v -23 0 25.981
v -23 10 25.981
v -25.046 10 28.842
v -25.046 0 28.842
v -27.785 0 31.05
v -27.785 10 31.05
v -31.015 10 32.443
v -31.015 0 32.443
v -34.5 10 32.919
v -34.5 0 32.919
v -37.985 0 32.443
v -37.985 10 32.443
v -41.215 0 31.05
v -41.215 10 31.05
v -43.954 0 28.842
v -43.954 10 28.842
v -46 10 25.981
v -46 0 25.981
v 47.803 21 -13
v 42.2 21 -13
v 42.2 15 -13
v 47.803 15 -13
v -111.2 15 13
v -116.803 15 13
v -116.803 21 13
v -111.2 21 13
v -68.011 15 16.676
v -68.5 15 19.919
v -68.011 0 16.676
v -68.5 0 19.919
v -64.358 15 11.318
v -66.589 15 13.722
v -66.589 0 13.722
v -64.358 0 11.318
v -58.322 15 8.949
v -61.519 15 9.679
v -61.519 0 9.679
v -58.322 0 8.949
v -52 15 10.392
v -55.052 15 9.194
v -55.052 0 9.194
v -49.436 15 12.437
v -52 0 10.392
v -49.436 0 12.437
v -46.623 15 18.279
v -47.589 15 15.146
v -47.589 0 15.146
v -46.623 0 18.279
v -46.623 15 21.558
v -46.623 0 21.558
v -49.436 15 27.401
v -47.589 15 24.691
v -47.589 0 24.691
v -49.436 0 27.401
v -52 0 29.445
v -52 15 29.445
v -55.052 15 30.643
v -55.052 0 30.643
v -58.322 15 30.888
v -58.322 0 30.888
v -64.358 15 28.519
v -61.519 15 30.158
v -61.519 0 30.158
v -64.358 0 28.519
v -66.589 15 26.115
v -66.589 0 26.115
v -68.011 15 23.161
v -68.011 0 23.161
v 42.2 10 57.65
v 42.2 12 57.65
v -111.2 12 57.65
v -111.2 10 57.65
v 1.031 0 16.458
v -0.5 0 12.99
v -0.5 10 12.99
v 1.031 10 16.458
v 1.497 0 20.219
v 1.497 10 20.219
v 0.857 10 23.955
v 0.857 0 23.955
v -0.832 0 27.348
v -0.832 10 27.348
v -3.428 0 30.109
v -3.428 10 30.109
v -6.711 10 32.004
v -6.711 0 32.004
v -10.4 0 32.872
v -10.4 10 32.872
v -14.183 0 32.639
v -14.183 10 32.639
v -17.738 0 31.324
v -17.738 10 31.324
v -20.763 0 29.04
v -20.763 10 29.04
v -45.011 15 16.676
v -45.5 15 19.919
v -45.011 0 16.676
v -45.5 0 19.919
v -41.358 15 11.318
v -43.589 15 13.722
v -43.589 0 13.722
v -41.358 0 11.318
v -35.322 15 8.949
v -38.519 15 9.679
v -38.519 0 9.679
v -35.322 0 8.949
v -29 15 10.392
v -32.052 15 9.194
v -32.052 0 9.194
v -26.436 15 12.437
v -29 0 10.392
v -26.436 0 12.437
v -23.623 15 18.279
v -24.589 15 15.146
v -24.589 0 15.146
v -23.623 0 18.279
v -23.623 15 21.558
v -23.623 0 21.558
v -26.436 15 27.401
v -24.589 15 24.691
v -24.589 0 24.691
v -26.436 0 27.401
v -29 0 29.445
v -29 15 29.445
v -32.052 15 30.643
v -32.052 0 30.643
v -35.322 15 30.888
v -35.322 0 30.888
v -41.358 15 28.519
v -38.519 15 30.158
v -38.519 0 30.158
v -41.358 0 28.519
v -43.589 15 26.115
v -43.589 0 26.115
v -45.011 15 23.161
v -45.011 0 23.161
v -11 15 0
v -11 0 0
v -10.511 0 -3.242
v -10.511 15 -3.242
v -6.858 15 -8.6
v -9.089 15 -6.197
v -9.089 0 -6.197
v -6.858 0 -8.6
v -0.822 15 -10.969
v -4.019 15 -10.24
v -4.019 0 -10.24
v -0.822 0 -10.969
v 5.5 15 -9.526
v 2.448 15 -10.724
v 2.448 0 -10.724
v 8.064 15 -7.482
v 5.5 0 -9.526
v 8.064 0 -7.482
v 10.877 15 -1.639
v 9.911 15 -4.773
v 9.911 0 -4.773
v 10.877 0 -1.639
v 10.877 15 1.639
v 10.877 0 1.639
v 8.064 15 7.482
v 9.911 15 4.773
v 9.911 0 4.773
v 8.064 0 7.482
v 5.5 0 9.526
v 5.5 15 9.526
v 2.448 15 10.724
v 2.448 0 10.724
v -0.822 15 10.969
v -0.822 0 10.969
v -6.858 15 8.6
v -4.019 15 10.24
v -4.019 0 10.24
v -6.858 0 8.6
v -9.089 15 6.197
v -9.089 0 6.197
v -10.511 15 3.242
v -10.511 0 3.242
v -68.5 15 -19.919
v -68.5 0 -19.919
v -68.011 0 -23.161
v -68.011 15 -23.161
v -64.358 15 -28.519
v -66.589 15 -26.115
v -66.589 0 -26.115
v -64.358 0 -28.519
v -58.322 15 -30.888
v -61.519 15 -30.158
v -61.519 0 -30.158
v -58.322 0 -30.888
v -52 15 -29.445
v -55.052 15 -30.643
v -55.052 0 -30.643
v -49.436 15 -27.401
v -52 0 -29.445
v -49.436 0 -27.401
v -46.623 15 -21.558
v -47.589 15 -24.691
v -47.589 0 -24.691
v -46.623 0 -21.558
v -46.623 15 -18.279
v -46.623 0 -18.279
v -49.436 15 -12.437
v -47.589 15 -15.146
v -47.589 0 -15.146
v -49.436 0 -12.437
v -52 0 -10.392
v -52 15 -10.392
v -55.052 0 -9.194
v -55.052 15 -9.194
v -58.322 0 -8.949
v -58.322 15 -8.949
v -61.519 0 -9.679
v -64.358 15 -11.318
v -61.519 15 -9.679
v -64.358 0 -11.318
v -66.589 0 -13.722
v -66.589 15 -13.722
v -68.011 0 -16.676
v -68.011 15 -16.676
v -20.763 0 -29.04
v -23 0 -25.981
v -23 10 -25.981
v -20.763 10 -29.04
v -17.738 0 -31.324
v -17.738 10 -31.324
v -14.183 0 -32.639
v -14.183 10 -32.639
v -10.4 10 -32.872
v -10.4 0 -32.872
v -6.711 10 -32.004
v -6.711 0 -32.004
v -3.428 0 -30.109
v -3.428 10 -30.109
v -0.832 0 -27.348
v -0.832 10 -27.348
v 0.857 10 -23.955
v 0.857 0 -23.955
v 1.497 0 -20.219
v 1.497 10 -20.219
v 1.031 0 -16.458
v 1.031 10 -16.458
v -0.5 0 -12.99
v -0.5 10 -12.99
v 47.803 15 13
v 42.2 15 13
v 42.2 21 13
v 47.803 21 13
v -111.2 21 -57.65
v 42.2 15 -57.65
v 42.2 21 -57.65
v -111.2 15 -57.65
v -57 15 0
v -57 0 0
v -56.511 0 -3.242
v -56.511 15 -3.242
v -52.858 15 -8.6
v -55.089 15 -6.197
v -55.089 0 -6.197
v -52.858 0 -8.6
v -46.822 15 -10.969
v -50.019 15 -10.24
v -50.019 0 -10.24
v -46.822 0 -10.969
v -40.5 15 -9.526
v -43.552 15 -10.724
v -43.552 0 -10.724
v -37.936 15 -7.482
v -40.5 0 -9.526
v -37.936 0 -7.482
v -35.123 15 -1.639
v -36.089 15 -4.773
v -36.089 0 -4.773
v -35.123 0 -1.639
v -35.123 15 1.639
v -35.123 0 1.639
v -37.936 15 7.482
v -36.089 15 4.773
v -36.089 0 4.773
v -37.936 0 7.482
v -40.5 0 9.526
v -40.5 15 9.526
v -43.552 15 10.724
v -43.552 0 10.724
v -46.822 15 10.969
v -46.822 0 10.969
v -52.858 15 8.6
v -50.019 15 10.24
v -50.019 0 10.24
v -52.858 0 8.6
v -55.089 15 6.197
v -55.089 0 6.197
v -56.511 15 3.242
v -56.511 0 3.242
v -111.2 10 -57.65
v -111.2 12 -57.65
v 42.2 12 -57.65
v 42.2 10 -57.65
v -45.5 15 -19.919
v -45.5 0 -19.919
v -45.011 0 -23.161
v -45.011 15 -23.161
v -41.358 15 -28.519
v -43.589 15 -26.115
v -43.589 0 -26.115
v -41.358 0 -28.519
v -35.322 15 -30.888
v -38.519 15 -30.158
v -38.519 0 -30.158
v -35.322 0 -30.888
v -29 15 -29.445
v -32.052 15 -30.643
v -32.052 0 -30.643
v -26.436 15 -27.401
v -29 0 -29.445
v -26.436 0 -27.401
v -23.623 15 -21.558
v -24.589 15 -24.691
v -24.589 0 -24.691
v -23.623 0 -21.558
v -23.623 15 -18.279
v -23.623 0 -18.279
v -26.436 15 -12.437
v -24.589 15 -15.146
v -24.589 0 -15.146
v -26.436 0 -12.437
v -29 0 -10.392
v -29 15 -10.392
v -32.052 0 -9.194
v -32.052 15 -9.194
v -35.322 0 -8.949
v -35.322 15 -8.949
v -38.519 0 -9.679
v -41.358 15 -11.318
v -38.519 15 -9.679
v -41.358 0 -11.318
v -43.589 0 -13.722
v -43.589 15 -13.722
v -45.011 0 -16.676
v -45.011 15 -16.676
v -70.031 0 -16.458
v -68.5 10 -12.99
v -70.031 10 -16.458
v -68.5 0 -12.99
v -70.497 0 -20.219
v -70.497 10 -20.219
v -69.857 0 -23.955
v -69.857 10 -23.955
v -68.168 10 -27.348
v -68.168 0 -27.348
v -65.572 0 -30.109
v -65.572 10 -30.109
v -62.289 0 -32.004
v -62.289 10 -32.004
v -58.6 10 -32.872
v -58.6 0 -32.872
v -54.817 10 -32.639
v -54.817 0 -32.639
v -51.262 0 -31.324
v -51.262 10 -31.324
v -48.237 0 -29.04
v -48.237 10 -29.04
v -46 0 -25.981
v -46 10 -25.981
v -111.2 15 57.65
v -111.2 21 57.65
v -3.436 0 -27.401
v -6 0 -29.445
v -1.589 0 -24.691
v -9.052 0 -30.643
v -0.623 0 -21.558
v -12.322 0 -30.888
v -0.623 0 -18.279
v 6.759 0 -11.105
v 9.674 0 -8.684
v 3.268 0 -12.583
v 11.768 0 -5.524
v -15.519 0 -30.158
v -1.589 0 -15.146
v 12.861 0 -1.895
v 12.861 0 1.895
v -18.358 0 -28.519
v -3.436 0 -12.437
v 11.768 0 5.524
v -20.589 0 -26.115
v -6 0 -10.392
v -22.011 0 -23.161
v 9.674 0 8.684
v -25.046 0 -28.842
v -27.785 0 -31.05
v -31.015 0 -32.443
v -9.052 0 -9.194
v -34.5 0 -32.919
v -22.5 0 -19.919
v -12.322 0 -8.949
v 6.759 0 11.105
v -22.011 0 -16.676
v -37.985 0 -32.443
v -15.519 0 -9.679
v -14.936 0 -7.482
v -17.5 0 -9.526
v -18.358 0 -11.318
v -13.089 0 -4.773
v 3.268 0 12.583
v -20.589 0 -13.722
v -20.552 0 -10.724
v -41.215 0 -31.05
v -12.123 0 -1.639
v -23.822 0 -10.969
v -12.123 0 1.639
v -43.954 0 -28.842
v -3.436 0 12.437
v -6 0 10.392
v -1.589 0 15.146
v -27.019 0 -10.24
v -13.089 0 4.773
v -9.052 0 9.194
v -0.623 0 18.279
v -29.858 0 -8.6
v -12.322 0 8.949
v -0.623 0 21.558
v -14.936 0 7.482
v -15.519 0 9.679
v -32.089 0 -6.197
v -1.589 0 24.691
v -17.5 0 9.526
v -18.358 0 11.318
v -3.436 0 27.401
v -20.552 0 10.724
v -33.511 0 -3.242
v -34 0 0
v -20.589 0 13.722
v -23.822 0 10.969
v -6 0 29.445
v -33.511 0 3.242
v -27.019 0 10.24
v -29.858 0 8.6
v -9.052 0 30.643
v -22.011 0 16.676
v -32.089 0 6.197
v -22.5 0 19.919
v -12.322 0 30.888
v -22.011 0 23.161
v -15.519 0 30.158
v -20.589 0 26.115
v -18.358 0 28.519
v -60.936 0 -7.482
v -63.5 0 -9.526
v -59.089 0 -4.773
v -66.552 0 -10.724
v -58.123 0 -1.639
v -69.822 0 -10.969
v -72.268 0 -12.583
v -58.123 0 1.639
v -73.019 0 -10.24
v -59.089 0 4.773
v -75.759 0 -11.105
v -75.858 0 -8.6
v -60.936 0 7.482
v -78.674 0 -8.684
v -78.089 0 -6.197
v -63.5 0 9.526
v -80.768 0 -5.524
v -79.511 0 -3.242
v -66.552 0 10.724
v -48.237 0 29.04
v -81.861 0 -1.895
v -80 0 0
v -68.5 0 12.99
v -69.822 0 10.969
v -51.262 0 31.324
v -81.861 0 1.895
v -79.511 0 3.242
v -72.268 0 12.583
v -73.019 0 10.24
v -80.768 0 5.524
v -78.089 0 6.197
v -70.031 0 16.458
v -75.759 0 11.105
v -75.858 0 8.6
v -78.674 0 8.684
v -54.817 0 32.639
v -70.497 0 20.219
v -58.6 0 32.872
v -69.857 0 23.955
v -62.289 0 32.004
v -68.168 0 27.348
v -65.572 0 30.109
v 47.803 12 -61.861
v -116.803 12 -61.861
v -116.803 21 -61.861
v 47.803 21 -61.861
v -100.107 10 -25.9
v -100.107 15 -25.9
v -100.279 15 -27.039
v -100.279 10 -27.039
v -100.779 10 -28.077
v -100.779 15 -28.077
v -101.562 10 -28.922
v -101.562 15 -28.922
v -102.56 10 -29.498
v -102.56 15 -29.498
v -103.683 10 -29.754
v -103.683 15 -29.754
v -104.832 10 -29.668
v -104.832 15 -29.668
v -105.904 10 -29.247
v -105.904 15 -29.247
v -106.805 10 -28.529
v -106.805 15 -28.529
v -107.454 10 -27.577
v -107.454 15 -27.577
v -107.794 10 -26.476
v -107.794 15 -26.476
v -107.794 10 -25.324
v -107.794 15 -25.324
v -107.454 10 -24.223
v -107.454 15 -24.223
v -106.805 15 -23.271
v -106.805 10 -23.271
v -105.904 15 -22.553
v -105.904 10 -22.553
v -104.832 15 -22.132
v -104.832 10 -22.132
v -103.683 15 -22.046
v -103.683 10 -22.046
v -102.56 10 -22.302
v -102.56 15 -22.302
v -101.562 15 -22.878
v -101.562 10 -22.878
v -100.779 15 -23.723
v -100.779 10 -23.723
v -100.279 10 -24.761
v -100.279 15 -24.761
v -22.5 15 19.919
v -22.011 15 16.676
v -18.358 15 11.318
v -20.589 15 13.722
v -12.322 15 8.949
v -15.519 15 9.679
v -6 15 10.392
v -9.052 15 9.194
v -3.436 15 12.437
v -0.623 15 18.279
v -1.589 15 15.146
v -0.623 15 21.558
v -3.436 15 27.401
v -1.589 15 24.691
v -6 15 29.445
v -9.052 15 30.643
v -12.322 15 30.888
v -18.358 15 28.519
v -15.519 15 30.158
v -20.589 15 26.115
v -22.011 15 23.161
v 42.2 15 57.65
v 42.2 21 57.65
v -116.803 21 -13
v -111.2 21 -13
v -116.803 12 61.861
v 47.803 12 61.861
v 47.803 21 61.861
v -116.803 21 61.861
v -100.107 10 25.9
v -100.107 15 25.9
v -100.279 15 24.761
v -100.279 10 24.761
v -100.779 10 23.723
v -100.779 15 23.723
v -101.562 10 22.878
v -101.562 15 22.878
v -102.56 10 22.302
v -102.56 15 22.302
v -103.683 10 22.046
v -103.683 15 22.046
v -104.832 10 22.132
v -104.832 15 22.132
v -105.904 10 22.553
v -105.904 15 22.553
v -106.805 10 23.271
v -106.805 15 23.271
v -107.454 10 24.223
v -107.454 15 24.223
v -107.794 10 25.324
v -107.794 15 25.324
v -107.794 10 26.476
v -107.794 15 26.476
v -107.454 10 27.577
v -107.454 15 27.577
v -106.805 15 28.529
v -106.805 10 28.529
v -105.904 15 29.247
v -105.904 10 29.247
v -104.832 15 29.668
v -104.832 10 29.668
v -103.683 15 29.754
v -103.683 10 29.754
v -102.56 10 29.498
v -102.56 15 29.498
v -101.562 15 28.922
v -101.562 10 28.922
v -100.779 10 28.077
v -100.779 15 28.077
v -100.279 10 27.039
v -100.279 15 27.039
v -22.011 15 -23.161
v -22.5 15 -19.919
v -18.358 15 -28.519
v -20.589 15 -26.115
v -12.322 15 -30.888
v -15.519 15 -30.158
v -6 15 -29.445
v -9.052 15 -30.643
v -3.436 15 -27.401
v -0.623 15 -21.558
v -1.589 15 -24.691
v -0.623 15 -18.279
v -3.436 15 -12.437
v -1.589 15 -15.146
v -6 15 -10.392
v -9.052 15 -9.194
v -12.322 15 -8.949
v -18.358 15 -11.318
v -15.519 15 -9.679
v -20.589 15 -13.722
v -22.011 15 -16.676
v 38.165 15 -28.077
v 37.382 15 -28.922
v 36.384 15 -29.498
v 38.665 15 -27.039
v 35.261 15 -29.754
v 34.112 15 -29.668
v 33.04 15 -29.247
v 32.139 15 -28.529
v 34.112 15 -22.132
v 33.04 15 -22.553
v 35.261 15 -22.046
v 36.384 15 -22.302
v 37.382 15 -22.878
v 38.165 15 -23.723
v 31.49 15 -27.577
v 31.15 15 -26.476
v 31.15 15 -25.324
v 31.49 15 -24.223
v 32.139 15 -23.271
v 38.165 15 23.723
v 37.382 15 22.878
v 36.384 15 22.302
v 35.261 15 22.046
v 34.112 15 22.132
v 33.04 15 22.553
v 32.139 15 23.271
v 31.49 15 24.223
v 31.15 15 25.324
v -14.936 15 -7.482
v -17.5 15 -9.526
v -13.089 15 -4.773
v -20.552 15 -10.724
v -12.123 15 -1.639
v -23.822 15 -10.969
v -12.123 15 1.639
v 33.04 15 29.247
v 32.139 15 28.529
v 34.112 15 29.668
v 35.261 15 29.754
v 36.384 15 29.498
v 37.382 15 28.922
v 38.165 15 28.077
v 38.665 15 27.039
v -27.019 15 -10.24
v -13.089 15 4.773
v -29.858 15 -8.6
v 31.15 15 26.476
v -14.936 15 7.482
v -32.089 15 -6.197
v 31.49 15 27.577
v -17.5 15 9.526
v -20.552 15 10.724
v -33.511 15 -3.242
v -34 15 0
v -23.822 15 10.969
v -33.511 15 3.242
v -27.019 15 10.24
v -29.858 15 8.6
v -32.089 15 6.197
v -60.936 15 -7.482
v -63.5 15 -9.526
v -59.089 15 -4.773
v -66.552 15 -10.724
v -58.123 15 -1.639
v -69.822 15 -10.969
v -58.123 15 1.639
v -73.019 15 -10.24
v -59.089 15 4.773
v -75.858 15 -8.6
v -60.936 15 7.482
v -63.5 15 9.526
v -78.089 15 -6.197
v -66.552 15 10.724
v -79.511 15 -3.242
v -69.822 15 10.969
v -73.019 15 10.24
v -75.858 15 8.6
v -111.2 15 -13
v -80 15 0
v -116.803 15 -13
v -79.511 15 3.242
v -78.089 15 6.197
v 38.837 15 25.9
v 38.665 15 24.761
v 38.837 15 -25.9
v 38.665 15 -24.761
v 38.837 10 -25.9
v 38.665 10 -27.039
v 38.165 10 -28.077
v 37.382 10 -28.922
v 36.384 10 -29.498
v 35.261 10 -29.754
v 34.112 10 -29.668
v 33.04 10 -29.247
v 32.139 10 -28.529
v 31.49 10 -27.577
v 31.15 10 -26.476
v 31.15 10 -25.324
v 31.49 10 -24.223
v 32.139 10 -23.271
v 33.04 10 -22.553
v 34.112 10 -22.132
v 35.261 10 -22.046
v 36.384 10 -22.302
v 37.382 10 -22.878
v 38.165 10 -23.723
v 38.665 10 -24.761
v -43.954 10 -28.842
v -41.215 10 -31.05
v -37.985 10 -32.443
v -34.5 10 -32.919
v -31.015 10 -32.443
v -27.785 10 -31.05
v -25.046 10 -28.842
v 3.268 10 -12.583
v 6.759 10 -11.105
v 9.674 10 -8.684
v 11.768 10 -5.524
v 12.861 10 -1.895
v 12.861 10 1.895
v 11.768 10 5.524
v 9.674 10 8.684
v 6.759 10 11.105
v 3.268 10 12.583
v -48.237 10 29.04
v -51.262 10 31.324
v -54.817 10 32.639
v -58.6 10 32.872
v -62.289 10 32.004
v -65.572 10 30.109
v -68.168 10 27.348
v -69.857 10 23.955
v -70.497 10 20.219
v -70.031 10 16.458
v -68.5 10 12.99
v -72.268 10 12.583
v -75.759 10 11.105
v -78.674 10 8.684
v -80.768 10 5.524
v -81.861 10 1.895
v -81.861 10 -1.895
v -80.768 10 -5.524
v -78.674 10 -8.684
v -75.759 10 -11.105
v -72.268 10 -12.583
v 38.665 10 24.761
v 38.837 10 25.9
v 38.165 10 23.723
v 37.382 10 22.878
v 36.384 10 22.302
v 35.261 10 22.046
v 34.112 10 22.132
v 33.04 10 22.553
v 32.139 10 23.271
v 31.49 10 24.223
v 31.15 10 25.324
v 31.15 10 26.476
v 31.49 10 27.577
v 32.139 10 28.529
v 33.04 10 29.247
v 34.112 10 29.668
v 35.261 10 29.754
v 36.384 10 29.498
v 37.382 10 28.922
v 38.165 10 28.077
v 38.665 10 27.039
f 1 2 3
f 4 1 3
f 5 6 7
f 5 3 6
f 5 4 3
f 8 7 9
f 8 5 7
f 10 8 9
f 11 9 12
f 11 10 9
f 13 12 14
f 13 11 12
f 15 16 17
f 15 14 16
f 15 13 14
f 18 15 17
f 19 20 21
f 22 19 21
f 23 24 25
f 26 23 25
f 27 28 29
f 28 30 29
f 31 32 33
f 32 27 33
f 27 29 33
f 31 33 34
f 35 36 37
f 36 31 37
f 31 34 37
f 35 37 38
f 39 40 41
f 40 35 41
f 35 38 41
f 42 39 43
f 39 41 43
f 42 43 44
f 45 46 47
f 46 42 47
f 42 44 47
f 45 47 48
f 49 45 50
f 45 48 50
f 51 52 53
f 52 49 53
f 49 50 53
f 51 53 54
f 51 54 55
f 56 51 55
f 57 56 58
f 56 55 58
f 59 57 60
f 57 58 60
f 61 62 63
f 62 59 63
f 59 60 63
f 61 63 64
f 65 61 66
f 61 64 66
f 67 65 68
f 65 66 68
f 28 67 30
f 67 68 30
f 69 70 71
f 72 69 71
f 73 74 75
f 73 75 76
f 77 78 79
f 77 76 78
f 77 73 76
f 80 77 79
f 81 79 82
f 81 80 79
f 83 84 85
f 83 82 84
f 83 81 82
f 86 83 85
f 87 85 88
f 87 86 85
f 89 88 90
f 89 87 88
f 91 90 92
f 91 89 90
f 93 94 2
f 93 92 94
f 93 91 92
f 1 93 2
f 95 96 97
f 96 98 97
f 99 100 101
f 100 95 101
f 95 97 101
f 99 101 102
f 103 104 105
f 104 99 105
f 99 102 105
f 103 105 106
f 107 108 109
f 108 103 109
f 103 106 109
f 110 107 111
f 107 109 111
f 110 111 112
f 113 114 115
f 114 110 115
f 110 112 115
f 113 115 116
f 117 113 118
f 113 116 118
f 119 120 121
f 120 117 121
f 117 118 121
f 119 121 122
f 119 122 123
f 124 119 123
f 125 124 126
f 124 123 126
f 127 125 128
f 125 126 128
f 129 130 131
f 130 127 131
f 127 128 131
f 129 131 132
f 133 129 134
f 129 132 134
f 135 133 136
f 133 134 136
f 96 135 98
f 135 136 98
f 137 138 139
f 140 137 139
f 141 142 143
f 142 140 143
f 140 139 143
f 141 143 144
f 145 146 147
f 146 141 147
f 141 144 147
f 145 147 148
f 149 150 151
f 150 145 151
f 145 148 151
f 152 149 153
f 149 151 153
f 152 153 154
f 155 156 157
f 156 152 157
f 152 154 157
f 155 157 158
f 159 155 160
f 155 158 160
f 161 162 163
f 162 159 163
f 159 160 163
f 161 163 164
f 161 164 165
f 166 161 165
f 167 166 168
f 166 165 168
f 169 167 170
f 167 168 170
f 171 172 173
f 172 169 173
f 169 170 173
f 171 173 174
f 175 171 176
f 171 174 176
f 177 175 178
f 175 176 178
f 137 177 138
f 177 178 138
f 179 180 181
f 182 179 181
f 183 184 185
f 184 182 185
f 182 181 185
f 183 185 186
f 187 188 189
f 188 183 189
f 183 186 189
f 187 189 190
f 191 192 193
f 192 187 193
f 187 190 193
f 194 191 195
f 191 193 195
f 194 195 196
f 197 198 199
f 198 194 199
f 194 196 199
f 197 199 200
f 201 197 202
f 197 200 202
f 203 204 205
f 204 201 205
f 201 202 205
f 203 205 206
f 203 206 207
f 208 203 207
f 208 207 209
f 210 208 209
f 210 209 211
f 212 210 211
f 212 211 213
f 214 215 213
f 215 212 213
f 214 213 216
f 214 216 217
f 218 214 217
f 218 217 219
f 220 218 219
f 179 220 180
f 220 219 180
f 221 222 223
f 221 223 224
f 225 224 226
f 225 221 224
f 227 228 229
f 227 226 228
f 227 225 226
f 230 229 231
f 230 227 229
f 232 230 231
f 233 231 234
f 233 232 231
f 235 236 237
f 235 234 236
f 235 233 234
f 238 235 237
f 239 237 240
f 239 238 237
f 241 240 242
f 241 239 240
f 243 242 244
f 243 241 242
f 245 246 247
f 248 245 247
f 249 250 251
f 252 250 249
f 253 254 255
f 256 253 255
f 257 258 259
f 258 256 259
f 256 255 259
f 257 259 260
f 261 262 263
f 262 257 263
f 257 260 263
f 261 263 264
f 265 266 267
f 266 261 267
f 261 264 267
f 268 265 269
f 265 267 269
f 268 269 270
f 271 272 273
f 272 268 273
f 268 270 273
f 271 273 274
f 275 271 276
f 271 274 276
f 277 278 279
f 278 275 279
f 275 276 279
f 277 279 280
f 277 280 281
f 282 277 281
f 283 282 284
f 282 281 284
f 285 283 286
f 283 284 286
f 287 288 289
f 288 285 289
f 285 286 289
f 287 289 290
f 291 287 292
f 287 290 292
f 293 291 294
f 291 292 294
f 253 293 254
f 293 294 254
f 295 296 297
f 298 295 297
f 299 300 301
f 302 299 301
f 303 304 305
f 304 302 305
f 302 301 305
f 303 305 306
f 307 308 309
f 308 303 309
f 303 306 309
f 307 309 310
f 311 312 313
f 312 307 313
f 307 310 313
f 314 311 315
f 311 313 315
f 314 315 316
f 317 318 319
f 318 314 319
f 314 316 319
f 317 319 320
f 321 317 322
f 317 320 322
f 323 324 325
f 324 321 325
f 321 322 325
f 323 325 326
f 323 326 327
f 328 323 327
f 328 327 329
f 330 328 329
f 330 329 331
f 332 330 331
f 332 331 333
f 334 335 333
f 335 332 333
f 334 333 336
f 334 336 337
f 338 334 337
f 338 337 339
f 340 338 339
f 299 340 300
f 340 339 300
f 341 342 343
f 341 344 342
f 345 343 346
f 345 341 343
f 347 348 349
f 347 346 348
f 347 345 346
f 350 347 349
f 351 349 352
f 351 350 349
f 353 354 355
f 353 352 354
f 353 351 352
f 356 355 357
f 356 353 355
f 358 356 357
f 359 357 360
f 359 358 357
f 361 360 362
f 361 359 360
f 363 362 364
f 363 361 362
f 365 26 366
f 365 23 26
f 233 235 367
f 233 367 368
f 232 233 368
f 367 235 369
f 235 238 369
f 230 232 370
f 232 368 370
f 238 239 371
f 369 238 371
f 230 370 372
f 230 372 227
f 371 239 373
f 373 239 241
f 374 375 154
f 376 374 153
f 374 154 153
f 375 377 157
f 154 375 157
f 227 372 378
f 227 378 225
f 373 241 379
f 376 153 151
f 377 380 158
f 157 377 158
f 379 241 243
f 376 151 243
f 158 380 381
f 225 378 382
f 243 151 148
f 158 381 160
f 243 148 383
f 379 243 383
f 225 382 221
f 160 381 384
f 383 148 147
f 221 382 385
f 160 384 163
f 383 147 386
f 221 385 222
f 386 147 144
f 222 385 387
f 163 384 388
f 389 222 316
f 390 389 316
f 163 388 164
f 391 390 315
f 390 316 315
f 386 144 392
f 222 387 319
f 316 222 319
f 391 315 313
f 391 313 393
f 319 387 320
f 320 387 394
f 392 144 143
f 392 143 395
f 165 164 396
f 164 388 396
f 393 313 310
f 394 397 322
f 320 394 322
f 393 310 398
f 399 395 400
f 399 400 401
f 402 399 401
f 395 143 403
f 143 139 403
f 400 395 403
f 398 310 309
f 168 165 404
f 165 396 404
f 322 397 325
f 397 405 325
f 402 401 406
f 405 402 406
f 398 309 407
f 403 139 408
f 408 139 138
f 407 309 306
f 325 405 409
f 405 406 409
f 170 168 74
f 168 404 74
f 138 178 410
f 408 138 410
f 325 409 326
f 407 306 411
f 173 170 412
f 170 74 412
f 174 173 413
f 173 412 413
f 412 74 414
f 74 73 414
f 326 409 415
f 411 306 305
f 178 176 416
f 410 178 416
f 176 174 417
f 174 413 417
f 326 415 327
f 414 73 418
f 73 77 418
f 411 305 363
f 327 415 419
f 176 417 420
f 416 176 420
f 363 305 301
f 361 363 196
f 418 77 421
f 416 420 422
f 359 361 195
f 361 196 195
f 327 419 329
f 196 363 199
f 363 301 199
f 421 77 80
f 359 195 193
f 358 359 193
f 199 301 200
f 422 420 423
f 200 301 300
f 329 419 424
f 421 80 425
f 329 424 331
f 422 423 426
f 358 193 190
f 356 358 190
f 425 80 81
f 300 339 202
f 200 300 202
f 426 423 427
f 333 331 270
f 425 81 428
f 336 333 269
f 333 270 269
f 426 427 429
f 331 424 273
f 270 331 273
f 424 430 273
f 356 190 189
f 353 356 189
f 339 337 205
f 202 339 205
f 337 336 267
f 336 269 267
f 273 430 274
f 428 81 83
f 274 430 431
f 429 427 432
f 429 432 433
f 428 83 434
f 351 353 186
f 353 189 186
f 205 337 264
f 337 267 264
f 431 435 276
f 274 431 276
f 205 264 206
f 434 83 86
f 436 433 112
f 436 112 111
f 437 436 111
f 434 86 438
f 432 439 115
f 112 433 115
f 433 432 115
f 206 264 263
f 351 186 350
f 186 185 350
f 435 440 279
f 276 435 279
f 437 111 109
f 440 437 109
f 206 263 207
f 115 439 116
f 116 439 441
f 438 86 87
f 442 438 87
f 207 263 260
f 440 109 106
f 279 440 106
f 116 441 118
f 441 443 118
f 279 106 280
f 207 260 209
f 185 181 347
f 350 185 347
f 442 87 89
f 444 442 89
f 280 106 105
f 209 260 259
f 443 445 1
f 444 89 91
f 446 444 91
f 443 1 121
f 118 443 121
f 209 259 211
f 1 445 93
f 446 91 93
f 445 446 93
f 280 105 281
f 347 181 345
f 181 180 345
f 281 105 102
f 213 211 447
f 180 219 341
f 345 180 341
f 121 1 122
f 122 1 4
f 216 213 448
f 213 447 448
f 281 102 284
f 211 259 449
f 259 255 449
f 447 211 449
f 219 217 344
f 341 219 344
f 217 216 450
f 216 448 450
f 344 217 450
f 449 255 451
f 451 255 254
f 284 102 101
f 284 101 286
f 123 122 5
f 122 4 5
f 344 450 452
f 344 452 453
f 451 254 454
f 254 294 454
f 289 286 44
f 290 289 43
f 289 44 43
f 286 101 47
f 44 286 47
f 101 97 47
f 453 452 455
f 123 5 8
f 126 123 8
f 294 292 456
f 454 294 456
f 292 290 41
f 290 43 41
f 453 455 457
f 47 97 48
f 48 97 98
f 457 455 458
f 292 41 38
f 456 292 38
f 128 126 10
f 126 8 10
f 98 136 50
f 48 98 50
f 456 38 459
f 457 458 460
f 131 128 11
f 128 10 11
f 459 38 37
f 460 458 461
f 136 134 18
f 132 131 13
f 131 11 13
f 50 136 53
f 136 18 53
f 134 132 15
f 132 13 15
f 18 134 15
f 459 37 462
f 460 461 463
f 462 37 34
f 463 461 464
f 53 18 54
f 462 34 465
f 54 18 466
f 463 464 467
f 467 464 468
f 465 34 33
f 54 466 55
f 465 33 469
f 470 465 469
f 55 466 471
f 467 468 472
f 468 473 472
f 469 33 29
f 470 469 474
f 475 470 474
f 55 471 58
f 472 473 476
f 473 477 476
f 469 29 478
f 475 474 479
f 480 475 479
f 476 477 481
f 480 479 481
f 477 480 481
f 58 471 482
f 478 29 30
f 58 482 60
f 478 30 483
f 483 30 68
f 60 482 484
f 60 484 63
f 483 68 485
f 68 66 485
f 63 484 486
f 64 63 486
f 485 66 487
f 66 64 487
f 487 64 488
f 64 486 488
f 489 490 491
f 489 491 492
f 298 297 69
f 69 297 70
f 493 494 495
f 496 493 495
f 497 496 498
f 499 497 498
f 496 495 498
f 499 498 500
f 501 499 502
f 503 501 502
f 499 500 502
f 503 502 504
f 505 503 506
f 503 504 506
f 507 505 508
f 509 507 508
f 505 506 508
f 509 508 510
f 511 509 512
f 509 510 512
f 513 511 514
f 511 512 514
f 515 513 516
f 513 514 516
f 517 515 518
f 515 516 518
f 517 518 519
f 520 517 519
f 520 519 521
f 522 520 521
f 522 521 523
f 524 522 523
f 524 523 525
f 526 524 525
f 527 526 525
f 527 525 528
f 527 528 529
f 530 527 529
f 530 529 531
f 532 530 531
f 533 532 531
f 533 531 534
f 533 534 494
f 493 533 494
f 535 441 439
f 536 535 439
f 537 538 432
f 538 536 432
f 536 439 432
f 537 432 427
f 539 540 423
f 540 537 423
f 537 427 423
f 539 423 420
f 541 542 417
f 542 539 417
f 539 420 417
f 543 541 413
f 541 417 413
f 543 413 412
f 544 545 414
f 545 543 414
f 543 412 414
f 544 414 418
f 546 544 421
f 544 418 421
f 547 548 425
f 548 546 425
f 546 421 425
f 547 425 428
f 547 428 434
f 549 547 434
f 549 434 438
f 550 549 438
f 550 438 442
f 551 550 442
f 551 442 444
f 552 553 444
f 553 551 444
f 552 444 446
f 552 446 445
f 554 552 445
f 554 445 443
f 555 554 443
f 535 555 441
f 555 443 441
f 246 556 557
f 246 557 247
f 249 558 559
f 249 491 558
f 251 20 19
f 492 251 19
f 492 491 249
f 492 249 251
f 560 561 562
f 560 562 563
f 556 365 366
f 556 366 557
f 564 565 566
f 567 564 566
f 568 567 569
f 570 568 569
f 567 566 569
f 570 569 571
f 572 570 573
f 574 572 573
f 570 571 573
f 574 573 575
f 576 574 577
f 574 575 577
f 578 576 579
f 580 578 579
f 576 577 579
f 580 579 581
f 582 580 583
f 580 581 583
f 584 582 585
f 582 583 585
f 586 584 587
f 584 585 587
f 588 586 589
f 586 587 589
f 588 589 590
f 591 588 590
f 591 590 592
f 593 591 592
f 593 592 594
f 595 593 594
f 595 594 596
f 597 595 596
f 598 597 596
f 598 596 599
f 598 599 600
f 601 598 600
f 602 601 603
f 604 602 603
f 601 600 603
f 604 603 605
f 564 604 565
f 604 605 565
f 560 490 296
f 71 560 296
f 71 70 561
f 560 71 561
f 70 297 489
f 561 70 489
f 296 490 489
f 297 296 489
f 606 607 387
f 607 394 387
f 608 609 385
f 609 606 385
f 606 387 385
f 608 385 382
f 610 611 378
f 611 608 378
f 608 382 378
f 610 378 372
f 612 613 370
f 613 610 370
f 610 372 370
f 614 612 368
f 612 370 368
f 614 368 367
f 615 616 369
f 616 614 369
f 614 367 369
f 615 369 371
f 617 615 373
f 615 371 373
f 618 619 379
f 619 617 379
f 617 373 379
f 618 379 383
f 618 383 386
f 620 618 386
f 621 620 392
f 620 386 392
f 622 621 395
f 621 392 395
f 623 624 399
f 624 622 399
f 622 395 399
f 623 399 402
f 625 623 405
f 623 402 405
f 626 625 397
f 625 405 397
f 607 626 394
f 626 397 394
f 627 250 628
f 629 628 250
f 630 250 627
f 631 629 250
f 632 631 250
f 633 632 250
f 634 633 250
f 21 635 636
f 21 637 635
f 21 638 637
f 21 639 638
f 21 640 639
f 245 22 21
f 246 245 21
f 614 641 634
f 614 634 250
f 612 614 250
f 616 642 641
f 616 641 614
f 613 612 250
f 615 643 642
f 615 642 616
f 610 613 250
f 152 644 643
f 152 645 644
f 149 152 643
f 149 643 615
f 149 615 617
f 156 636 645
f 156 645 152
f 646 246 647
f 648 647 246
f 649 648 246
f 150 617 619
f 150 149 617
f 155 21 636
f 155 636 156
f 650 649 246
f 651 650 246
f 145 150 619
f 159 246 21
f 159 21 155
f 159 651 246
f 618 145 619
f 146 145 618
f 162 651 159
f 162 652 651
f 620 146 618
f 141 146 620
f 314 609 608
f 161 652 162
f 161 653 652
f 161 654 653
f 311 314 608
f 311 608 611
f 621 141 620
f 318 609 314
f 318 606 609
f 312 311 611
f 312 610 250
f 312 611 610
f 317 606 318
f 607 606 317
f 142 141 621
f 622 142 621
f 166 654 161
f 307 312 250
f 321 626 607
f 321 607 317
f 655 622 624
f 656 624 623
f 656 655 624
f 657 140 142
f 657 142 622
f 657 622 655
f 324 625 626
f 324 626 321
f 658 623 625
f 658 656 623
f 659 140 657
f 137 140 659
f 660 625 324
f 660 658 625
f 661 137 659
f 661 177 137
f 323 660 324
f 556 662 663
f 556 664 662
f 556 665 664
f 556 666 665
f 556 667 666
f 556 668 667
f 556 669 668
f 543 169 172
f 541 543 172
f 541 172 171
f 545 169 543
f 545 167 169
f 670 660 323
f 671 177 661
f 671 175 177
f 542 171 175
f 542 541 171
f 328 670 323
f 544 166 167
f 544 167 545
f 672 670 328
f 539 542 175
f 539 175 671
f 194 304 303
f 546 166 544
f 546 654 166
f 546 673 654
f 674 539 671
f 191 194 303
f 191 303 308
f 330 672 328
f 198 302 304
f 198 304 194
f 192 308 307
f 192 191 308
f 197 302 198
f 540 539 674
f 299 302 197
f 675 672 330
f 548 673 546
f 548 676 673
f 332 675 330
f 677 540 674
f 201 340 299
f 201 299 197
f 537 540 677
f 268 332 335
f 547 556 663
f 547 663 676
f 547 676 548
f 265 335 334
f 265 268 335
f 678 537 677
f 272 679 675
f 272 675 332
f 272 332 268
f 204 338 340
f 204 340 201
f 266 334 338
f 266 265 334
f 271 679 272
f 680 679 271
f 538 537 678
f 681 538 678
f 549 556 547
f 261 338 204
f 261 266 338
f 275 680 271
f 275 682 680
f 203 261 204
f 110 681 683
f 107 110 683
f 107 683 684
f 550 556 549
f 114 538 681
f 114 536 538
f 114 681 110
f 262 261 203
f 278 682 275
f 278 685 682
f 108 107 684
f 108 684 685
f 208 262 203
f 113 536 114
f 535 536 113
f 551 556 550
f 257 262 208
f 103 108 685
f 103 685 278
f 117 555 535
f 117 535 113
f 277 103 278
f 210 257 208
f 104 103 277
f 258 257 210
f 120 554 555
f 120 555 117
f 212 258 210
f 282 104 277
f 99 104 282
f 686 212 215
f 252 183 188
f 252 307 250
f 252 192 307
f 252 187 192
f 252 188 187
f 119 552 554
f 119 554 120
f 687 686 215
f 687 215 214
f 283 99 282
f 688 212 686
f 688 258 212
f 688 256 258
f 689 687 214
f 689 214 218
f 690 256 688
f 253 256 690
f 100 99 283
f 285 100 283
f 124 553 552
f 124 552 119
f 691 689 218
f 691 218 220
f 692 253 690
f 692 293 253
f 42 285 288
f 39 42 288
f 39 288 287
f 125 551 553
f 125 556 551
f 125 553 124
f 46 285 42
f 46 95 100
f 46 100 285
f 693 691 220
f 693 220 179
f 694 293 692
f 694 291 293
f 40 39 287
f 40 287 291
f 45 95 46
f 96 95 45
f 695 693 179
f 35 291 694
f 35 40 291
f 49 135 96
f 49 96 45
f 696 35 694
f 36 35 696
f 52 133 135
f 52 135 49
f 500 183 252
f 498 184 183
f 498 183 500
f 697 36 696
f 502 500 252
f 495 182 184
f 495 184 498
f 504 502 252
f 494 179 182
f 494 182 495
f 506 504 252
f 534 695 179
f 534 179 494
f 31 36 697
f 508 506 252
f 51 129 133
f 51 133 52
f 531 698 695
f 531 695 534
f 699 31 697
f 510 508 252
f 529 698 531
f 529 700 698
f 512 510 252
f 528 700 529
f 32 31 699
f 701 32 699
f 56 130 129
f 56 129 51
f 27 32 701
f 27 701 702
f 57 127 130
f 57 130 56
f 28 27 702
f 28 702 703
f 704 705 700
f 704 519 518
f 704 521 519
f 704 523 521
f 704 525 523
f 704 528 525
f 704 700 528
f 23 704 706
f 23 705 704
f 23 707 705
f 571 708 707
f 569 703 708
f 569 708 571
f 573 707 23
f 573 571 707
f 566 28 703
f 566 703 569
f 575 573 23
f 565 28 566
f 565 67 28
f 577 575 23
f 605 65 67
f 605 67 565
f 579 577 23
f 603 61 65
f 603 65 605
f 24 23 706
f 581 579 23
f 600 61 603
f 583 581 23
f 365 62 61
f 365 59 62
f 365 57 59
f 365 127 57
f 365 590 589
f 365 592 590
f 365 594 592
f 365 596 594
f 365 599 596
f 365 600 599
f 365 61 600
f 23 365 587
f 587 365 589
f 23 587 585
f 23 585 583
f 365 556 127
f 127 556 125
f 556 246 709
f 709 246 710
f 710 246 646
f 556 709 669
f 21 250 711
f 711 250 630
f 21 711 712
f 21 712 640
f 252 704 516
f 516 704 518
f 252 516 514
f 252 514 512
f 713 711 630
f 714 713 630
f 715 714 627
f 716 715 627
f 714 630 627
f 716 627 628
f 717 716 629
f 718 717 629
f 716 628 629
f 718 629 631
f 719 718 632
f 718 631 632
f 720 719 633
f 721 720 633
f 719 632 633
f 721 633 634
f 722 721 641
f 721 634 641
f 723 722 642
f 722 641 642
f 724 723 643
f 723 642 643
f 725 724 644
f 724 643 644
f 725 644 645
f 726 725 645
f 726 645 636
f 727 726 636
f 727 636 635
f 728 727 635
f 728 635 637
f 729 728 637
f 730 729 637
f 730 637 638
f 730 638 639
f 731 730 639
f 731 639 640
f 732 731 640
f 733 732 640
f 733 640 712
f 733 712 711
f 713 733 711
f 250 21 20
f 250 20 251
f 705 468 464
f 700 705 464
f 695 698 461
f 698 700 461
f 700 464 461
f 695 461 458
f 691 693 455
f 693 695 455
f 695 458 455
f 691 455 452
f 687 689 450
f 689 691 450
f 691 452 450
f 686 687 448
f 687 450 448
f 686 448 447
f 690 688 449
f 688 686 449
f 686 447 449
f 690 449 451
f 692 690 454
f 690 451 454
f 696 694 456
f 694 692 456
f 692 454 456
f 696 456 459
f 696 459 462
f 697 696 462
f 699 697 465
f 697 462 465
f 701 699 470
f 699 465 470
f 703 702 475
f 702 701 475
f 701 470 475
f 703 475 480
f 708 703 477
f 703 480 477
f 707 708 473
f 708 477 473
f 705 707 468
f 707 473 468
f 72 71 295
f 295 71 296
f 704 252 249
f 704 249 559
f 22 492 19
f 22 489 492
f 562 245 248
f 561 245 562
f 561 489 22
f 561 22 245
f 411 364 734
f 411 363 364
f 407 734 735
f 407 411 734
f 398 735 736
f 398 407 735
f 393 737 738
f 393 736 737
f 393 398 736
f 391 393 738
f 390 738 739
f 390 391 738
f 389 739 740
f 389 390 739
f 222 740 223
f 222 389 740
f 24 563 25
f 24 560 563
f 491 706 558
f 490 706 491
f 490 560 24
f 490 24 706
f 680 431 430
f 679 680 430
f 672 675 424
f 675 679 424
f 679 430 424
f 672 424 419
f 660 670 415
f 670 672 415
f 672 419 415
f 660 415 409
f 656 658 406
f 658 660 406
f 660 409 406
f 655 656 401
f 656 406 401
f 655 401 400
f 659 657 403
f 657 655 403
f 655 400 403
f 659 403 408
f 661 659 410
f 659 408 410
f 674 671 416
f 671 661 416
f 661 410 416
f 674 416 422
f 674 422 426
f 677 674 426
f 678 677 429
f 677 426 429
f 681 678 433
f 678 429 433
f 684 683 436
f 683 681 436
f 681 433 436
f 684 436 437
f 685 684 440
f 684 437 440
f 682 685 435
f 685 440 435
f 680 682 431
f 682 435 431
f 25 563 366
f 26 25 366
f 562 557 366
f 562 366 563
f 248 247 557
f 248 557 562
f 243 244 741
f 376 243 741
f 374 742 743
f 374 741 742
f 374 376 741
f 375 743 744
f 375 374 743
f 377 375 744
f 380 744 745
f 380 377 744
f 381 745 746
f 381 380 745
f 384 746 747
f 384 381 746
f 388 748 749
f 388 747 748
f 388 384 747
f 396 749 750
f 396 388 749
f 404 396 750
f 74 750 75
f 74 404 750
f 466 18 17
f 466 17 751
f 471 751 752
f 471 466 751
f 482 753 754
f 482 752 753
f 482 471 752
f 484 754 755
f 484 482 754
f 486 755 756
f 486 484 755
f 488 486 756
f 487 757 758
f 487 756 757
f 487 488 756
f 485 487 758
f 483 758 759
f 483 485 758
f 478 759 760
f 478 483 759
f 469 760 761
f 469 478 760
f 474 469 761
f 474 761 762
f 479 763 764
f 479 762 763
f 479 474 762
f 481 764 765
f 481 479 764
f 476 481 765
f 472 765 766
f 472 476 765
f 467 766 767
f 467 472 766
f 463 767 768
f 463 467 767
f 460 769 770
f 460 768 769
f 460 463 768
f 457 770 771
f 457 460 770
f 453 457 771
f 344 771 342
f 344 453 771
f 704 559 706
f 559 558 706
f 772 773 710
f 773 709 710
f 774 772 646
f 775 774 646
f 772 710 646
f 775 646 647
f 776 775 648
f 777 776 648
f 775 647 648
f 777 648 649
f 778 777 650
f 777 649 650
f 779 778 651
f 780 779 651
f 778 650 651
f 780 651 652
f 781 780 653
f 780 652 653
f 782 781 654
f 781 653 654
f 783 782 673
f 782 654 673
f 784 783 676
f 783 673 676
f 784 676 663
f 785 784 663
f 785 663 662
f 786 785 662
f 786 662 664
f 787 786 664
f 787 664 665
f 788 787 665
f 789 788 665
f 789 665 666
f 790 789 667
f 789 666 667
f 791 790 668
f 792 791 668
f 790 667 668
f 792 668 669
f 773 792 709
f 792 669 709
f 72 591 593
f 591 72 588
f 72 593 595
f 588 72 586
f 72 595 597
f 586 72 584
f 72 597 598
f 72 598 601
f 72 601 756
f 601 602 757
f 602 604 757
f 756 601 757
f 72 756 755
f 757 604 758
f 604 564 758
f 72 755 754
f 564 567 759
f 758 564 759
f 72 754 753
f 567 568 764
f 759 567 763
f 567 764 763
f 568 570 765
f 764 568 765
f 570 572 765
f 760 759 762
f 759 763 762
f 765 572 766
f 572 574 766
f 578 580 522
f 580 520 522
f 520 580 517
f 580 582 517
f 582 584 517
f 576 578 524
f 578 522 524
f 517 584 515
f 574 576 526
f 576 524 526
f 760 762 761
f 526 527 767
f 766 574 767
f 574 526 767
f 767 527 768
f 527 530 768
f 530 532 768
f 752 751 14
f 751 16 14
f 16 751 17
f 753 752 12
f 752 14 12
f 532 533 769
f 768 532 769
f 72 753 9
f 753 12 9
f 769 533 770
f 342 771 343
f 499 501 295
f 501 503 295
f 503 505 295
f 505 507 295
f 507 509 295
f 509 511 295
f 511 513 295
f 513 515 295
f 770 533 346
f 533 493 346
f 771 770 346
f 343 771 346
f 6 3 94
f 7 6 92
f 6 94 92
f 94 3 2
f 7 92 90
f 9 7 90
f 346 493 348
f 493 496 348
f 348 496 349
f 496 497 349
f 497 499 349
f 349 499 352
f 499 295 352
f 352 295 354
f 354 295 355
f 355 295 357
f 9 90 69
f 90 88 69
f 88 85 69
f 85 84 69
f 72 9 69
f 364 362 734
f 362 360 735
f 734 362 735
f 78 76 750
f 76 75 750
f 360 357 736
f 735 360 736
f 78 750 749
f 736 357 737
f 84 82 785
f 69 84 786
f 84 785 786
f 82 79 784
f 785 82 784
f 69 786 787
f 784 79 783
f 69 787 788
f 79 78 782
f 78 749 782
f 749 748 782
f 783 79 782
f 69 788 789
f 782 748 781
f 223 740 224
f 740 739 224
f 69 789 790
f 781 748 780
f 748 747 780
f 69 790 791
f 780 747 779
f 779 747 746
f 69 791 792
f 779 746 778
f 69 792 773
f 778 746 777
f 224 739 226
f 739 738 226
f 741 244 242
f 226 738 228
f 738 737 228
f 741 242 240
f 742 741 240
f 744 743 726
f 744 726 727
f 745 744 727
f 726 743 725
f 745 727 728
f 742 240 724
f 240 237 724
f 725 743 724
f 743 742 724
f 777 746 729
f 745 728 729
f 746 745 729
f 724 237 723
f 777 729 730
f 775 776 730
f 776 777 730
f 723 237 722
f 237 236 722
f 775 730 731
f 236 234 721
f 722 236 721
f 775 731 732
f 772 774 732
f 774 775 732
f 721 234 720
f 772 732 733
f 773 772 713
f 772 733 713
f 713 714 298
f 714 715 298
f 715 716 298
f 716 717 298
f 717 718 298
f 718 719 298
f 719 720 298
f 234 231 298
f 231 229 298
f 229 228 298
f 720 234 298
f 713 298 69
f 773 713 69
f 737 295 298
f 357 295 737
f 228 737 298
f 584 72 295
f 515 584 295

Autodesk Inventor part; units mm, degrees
ref_plane "YZ Plane" through (0, 0, 0) normal (1, 0, 0) x (0, 1, 0)
ref_plane "XZ Plane" through (0, 0, 0) normal (0, 1, 0) x (-1, 0, 0)
ref_plane "XY Plane" through (0, 0, 0) normal (0, 0, 1) x (1, 0, 0)
sketch "Sketch1" plane through (0, 0, 0) normal (0, 1, 0) x (-1, 0, 0)
  circle A0 centre (0, 0) radius 11
  line L0 (11, 0.0002) -> (12, 0.0002) construction
  circle A1 centre (23, 0) radius 11
  line L1 (34, 0) -> (35, 0) construction
  circle A2 centre (46, 0) radius 11
  line L2 (57, 0) -> (58, 0) construction
  circle A3 centre (69, 0) radius 11
  line L3 (34.5, 0) -> (34.5, -17.154) construction
  line L4 (34.5, 0) -> (34.5, 17.658) construction
  line L5 (55, 12.6387) -> (55, -13.5831) construction
  line L6 (55, 12.6387) -> (55, 17.658) construction
  line L7 (55, -13.5831) -> (55, -17.154) construction
  line L8 (11.5, 0.0002) -> (11.5, -16.2579) construction
  line L9 (11.5, 0.0002) -> (11.5, 19.9186) construction
  circle A4 centre (0, 0) radius 12 construction
  circle A5 centre (23, 0) radius 12 construction
  circle A6 centre (46, 0) radius 12 construction
  circle A7 centre (69, 0) radius 12 construction
  circle A8 centre (11.5, 19.9186) radius 11
  circle A9 centre (34.5, 19.9186) radius 11
  circle A10 centre (11.5, -19.9186) radius 11
  circle A11 centre (57.5, 19.9186) radius 11
  circle A12 centre (57.5, -19.9186) radius 12 construction
  circle A13 centre (34.5, -19.9186) radius 12 construction
  circle A14 centre (11.5, 19.9186) radius 12 construction
  circle A15 centre (34.5, 19.9186) radius 12 construction
  circle A16 centre (57.5, 19.9186) radius 12 construction
  line L10 (11.5, 19.9186) -> (57.5, 19.9186) construction
  arc A17 (2.3131, -12.7926) -> (0.5, -12.9904) centre (0, 0) ccw construction
  circle A18 centre (11.5, 19.9186) radius 13 construction
  circle A19 centre (34.5, 19.9186) radius 13 construction
  circle A20 centre (57.5, 19.9186) radius 13 construction
  circle A21 centre (69, 0) radius 13 construction
  circle A22 centre (57.5, -19.9186) radius 13 construction
  circle A23 centre (34.5, -19.9186) radius 13 construction
  arc A24 (0.5, 12.9904) -> (0.5, -12.9904) centre (0, 0) ccw
  line L11 (57.5, -19.9186) -> (11.5, -19.9186) construction
  circle A25 centre (11.5, -19.9186) radius 13 construction
  arc A26 (0.5, -12.9904) -> (23, -25.9808) centre (11.5, -19.9186) ccw
  arc A27 (23, -25.9808) -> (46, -25.9808) centre (34.5, -19.9186) ccw
  arc A28 (46, -25.9808) -> (68.5, -12.9904) centre (57.5, -19.9186) ccw
  arc A29 (68.5, -12.9904) -> (68.5, 12.9904) centre (69, 0) ccw
  arc A30 (68.5, 12.9904) -> (46, 25.9808) centre (57.5, 19.9186) ccw
  arc A31 (46, 25.9808) -> (23, 25.9808) centre (34.5, 19.9186) ccw
  arc A32 (23, 25.9808) -> (0.5, 12.9904) centre (11.5, 19.9186) ccw
  circle A33 centre (11.5, -19.9186) radius 12 construction
  circle A34 centre (34.5, -19.9186) radius 11
  circle A35 centre (57.5, -19.9186) radius 11
  dimension "d0" = 22
  dimension "d6" = 22
  dimension "d1" = 1
  dimension "d2" = 22
  dimension "d3" = 1
  dimension "d4" = 22
  dimension "d5" = 1
  dimension "d7" = 24
  dimension "d8" = 24
  dimension "d9" = 24
  dimension "d10" = 24
  dimension "d11" = 22
  dimension "d12" = 22
  dimension "d16" = 22
  dimension "d17" = 22
  dimension "d19" = 24
  dimension "d21" = 24
  dimension "d22" = 24
  dimension "d23" = 24
  dimension "d25" = 26
  dimension "d27" = 26
  dimension "d28" = 26
  dimension "d29" = 26
  dimension "d30" = 26
  dimension "d31" = 26
  dimension "d32" = 26
  dimension "d33" = 26
  dimension "d67" = 24
  dimension "d71" = 24
  dimension "d72" = 22
  dimension "d73" = 22
extrude "Extrusion1" add sketch "Sketch1" along normal blind 15
sketch "Sketch2" plane through (0, 15, 0) normal (0, 1, 0) x (1, 0, 0)
  circle A0 centre (-23, 0) radius 11 projected
  circle A1 centre (-46, 0) radius 11 projected
  line L0 (-35, 0) -> (-34, 0) construction
  line L1 (-111.2, 57.65) -> (42.2, 57.65)
  line L2 (42.2, 57.65) -> (42.2, -57.65)
  line L3 (42.2, -57.65) -> (-111.2, -57.65)
  line L4 (-111.2, -57.65) -> (-111.2, 57.65)
  line L5 (-111.2, 57.65) -> (42.2, -57.65) construction
  line L6 (42.2, 57.65) -> (-111.2, -57.65) construction
  arc A2 (-46, 25.9808) -> (-68.5, 12.9904) centre (-57.5, 19.9186) ccw projected
  arc A3 (-23, 25.9808) -> (-46, 25.9808) centre (-34.5, 19.9186) ccw projected
  arc A4 (-0.5, 12.9904) -> (-23, 25.9808) centre (-11.5, 19.9186) ccw projected
  arc A5 (-0.5, -12.9904) -> (-0.5, 12.9904) centre (0, 0) ccw projected
  arc A6 (-23, -25.9808) -> (-0.5, -12.9904) centre (-11.5, -19.9186) ccw projected
  arc A7 (-46, -25.9808) -> (-23, -25.9808) centre (-34.5, -19.9186) ccw projected
  arc A8 (-68.5, -12.9904) -> (-46, -25.9808) centre (-57.5, -19.9186) ccw projected
  arc A9 (-68.5, 12.9904) -> (-68.5, -12.9904) centre (-69, 0) ccw projected
  arc A10 (-69, 13) -> (-68.5, -12.9904) centre (-69, 0) ccw
  arc A11 (-46, 25.9808) -> (-68.5, 12.9904) centre (-57.5, 19.9186) ccw
  arc A12 (-23, 25.9808) -> (-46, 25.9808) centre (-34.5, 19.9186) ccw
  arc A13 (-0.5, 12.9904) -> (-23, 25.9808) centre (-11.5, 19.9186) ccw
  arc A14 (-0.5, -12.9904) -> (-0.5, 12.9904) centre (0, 0) ccw
  arc A15 (-23, -25.9808) -> (-0.5, -12.9904) centre (-11.5, -19.9186) ccw
  arc A16 (-46, -25.9808) -> (-23, -25.9808) centre (-34.5, -19.9186) ccw
  arc A17 (-68.5, -12.9904) -> (-46, -25.9808) centre (-57.5, -19.9186) ccw
  arc A18 (-68.5, 12.9904) -> (-68.5, -12.9904) centre (-69, 0) ccw
  point P0 (-34.5, 0)
  dimension "d36" = 115.3
  dimension "d37" = 153.4
extrude "Extrusion2" add sketch "Sketch2" against normal blind 5 contours L1 L2 L3 L4
sketch "Sketch3" plane through (0, 15, 0) normal (0, 1, 0) x (1, 0, 0)
  line L0 (42.2, 57.65) -> (-111.2, 57.65) projected
  line L1 (42.2, -57.65) -> (42.2, 57.65) projected
  line L2 (-111.2, -57.65) -> (42.2, -57.65) projected
  line L3 (-111.2, 57.65) -> (-111.2, -57.65) projected
  line L4 (-111.2, -57.65) -> (42.2, -57.65) projected
  line L5 (42.2, -57.65) -> (42.2, 57.65) projected
  line L6 (42.2, 57.65) -> (-111.2, 57.65) projected
  line L7 (-111.2, 57.65) -> (-111.2, -57.65) projected
  circle A0 centre (-57.5, -19.9186) radius 11 projected
  circle A1 centre (-11.5, 19.9186) radius 11 projected
  circle A2 centre (-34.5, -19.9186) radius 11 projected
  circle A3 centre (-11.5, -19.9186) radius 11 projected
  circle A4 centre (-69, 0) radius 11 projected
  circle A5 centre (-46, 0) radius 11 projected
  circle A6 centre (-23, 0) radius 11 projected
  circle A7 centre (0, 0) radius 11 projected
  line L8 (-116.8026, 61.8611) -> (47.8026, 61.8611)
  line L9 (47.8026, 61.8611) -> (47.8026, -61.8611)
  line L10 (47.8026, -61.8611) -> (-116.8026, -61.8611)
  line L11 (-116.8026, -61.8611) -> (-116.8026, 61.8611)
  line L12 (-116.8026, 61.8611) -> (47.8026, -61.8611) construction
  line L13 (47.8026, 61.8611) -> (-116.8026, -61.8611) construction
  line L14 (-111.2, -57.65) -> (42.2, -57.65)
  line L15 (42.2, -57.65) -> (42.2, 57.65)
  line L16 (42.2, 57.65) -> (-111.2, 57.65)
  line L17 (-111.2, 57.65) -> (-111.2, -57.65)
  line L18 (-111.2, -57.65) -> (42.2, 57.65) construction
  line L19 (42.2, -57.65) -> (-111.2, 57.65) construction
  point P0 (-34.5, 0)
extrude "Extrusion3" add sketch "Sketch3" along normal blind 6 and the other way blind 3 contours L8 L9 L10 L11
sketch "Sketch4" plane through (0, 15, 0) normal (0, 1, 0) x (1, 0, 0)
  line L0 (-111.2, -57.65) -> (42.2, -57.65) projected
  line L1 (42.2, -57.65) -> (42.2, 57.65) projected
  line L2 (42.2, 57.65) -> (-111.2, 57.65) projected
  line L3 (-111.2, 57.65) -> (-111.2, -57.65) projected
  circle A0 centre (-57.5, -19.9186) radius 11 projected
  circle A1 centre (-11.5, 19.9186) radius 11 projected
  circle A2 centre (-34.5, -19.9186) radius 11 projected
  circle A3 centre (-11.5, -19.9186) radius 11 projected
  circle A4 centre (-69, 0) radius 11 projected
  circle A5 centre (-46, 0) radius 11 projected
  circle A6 centre (-23, 0) radius 11 projected
  circle A7 centre (0, 0) radius 11 projected
  line L4 (-111.2, 57.65) -> (-103.972, 57.65) construction
  line L5 (-103.972, 57.65) -> (-103.972, 25.9) construction
  line L6 (-103.972, 25.9) -> (-111.2, 25.9) construction
  line L7 (-111.2, 25.9) -> (-111.2, 57.65) construction
  line L8 (42.2, 57.65) -> (34.972, 57.65) construction
  line L9 (34.972, 57.65) -> (34.972, 25.9) construction
  line L10 (34.972, 25.9) -> (42.2, 25.9) construction
  line L11 (42.2, 25.9) -> (42.2, 57.65) construction
  line L12 (-111.2, -57.65) -> (-103.972, -57.65) construction
  line L13 (-103.972, -57.65) -> (-103.972, -25.9) construction
  line L14 (-103.972, -25.9) -> (-111.2, -25.9) construction
  line L15 (-111.2, -25.9) -> (-111.2, -57.65) construction
  line L16 (42.2, -25.9) -> (34.972, -25.9) construction
  line L17 (34.972, -25.9) -> (34.972, -57.65) construction
  line L18 (34.972, -57.65) -> (42.2, -57.65) construction
  line L19 (42.2, -57.65) -> (42.2, -25.9) construction
  circle A8 centre (-103.972, 25.9) radius 3.865
  circle A9 centre (34.972, 25.9) radius 3.865
  circle A10 centre (34.972, -25.9) radius 3.865
  circle A11 centre (-103.972, -25.9) radius 3.865
  dimension "d56" = 7.73
  dimension "d57" = 7.73
  dimension "d58" = 7.73
  dimension "d59" = 7.73
  dimension "d62" = 7.228
  dimension "d63" = 31.75
  dimension "d64" = 7.228
  dimension "d65" = 7.228
  dimension "d66" = 31.75
extrude "Extrusion4" cut sketch "Sketch4" against normal through all contours A8 | A9 | A10 | A11
sketch "Sketch5" plane through (-116.8026, 12, 61.8611) normal (-1, 0, 0) x (0, 0, 1)
  line L0 (-74.8611, -12) -> (-74.8611, -2) projected
  line L1 (-48.8611, -12) -> (-48.8611, -2) projected
  line L2 (-119.5111, 3) -> (-4.2111, 3) projected
  line L3 (-123.7222, 9) -> (0, 9) projected
  line L4 (-74.8611, 3) -> (-48.8611, 3)
  line L5 (-48.8611, 3) -> (-48.8611, 9)
  line L6 (-48.8611, 9) -> (-74.8611, 9)
  line L7 (-74.8611, 9) -> (-74.8611, 3)
  point P0 (-61.8611, -12)
extrude "Extrusion5" cut sketch "Sketch5" against normal through all
properties part number "CELLCASE21700_3DPrint"
